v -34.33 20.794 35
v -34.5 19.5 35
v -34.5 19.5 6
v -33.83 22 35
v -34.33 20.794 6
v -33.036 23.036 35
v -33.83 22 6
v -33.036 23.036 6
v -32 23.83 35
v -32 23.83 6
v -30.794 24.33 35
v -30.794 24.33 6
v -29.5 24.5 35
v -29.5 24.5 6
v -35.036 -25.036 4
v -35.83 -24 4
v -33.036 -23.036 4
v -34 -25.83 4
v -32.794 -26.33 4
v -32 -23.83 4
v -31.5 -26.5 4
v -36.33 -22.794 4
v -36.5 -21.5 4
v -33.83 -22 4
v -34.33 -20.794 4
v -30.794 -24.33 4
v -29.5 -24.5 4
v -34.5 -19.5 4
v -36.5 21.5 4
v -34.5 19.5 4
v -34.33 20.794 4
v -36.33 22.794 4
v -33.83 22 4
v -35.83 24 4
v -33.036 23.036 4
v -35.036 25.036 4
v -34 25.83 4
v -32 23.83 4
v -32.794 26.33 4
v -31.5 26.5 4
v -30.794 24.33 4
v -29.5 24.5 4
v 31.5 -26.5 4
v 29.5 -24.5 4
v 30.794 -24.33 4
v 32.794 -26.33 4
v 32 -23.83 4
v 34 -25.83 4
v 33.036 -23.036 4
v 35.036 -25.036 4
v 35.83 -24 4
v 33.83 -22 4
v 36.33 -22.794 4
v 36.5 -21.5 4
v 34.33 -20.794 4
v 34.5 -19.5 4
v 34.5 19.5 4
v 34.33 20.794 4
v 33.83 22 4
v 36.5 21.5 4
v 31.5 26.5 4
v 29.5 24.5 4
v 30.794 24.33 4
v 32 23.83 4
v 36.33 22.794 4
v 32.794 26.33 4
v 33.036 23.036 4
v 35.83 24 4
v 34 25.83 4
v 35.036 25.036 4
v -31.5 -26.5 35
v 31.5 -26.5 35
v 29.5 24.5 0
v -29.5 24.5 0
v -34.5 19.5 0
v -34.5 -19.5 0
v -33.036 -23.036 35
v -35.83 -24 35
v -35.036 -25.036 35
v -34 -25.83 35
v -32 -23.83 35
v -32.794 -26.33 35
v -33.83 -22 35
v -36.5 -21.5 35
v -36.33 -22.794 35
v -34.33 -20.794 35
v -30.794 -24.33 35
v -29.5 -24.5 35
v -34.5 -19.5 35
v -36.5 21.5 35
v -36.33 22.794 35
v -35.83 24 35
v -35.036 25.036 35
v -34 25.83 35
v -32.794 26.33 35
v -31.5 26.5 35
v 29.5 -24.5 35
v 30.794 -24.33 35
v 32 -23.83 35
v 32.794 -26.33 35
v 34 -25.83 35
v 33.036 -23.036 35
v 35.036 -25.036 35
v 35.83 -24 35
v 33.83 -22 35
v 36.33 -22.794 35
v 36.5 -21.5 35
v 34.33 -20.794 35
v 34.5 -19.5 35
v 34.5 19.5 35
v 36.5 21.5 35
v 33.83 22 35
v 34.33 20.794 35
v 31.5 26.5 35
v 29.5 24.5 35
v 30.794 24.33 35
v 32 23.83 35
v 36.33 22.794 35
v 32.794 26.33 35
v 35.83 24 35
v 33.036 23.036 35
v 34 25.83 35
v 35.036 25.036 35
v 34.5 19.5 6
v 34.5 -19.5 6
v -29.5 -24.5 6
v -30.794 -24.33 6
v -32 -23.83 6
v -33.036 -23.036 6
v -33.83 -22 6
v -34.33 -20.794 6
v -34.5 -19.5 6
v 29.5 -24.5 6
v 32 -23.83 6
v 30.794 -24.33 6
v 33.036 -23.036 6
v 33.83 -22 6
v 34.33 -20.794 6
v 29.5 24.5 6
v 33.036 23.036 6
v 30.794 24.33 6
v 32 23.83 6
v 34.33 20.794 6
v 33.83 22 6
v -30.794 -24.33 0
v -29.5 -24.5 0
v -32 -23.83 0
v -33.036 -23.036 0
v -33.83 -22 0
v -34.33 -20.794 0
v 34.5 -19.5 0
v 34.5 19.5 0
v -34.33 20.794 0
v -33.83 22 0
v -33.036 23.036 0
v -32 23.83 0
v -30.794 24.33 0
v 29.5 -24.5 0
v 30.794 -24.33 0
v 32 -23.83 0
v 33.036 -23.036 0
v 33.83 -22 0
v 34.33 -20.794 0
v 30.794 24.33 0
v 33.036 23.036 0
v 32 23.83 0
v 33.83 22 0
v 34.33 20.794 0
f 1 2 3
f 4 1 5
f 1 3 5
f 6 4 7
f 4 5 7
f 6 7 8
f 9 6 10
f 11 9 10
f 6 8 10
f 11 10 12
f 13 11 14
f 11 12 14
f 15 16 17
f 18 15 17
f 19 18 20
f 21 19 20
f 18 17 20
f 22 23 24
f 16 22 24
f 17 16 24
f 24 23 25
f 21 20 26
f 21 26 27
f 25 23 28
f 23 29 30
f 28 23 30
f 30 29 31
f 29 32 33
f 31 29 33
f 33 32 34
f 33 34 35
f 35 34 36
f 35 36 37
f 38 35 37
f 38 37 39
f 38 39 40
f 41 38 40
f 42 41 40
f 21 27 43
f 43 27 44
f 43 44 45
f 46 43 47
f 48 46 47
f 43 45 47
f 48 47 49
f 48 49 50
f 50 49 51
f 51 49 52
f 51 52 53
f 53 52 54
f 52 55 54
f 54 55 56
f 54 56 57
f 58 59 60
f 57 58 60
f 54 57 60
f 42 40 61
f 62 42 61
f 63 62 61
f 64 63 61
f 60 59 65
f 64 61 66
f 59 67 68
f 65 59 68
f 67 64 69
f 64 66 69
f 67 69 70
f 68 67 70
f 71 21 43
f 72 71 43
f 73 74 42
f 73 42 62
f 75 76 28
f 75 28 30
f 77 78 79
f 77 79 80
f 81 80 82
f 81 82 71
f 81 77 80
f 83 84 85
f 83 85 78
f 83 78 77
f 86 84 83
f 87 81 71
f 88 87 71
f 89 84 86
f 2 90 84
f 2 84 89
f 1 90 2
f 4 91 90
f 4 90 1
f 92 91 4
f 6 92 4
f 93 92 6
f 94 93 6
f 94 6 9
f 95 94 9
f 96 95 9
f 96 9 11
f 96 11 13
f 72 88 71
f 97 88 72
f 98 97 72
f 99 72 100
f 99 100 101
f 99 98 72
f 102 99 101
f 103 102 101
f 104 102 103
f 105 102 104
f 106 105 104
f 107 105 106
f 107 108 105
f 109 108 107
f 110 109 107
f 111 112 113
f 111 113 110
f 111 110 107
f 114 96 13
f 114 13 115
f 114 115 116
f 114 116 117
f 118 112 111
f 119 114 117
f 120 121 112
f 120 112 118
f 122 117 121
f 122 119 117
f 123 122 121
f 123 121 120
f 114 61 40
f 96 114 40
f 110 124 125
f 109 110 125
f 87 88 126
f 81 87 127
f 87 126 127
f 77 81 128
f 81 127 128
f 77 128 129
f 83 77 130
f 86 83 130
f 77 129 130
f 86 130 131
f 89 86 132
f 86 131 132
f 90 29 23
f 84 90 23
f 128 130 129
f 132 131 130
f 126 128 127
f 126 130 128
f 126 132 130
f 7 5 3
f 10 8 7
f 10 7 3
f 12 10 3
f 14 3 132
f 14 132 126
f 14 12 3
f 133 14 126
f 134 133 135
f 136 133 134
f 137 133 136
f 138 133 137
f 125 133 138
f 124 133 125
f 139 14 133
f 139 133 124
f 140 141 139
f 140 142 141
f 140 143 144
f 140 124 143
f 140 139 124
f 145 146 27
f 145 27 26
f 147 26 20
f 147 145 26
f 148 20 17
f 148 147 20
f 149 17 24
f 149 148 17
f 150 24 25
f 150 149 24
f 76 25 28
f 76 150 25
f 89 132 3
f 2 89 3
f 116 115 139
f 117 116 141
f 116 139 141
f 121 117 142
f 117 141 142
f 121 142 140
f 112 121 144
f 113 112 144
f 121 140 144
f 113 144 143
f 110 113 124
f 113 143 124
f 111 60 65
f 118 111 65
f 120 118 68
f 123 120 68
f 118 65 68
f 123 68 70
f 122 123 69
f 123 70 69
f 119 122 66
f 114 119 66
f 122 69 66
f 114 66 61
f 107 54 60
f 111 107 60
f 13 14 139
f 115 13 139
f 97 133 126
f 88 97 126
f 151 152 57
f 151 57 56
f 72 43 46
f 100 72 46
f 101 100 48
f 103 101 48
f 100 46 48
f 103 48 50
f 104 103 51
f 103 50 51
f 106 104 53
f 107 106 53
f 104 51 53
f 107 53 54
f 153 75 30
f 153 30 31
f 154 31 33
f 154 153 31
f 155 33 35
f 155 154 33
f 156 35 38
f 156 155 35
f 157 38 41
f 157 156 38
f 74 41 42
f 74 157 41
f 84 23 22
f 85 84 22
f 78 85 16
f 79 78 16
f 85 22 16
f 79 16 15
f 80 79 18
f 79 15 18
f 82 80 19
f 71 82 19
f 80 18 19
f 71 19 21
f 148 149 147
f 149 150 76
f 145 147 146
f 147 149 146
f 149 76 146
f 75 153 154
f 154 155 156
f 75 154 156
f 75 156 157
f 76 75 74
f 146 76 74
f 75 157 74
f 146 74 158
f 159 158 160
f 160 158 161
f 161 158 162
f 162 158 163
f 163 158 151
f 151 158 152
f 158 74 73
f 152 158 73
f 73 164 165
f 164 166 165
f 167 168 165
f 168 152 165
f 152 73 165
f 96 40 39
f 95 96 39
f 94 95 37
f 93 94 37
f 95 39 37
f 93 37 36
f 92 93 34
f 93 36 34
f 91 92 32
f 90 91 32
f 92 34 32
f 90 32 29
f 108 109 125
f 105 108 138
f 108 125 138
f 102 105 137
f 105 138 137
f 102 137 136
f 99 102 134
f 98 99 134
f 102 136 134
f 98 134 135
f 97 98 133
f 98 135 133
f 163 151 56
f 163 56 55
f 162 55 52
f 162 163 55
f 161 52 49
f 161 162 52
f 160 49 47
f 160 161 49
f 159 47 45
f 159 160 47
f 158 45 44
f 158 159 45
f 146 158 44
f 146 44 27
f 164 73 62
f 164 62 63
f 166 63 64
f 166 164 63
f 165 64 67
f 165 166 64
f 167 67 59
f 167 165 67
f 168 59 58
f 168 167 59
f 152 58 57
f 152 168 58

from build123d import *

# Parameters (mm, degrees)
F1_DEPTH = 6
F2_DEPTH = 35
F3_DEPTH = 4


with BuildPart() as f1:
    # F0 (on Top) → F1 (new body)
    with BuildSketch(Plane.XY):
        with BuildLine():
            Line((31.5, 26.5), (-31.5, 26.5))
            ThreePointArc((-31.5, 26.5), (-35.0355339059, 25.0355339059), (-36.5, 21.5))
            Line((-36.5, 21.5), (-36.5, -21.5))
            ThreePointArc((-36.5, -21.5), (-35.0355339059, -25.0355339059), (-31.5, -26.5))
            Line((-31.5, -26.5), (31.5, -26.5))
            ThreePointArc((31.5, -26.5), (35.0355339059, -25.0355339059), (36.5, -21.5))
            Line((36.5, -21.5), (36.5, 21.5))
            ThreePointArc((36.5, 21.5), (35.0355339059, 25.0355339059), (31.5, 26.5))
        make_face()
        with BuildLine():
            ThreePointArc((-34.5, 19.5), (-33.0355339059, 23.0355339059), (-29.5, 24.5))
            Line((-29.5, 24.5), (29.5, 24.5))
            ThreePointArc((29.5, 24.5), (33.0355339059, 23.0355339059), (34.5, 19.5))
            Line((34.5, 19.5), (34.5, -19.5))
            ThreePointArc((34.5, -19.5), (33.0355339059, -23.0355339059), (29.5, -24.5))
            Line((29.5, -24.5), (-29.5, -24.5))
            ThreePointArc((-29.5, -24.5), (-33.0355339059, -23.0355339059), (-34.5, -19.5))
            Line((-34.5, -19.5), (-34.5, 19.5))
        make_face(mode=Mode.SUBTRACT)
        with BuildLine():
            Line((29.5, 24.5), (-29.5, 24.5))
            ThreePointArc((-29.5, 24.5), (-33.0355339059, 23.0355339059), (-34.5, 19.5))
            Line((-34.5, 19.5), (-34.5, -19.5))
            ThreePointArc((-34.5, -19.5), (-33.0355339059, -23.0355339059), (-29.5, -24.5))
            Line((-29.5, -24.5), (29.5, -24.5))
            ThreePointArc((29.5, -24.5), (33.0355339059, -23.0355339059), (34.5, -19.5))
            Line((34.5, -19.5), (34.5, 19.5))
            ThreePointArc((34.5, 19.5), (33.0355339059, 23.0355339059), (29.5, 24.5))
        make_face()
    extrude(amount=F1_DEPTH)

    # F0 (on Top) → F2 (join)
    with BuildSketch(Plane.XY):
        with BuildLine():
            Line((31.5, 26.5), (-31.5, 26.5))
            ThreePointArc((-31.5, 26.5), (-35.0355339059, 25.0355339059), (-36.5, 21.5))
            Line((-36.5, 21.5), (-36.5, -21.5))
            ThreePointArc((-36.5, -21.5), (-35.0355339059, -25.0355339059), (-31.5, -26.5))
            Line((-31.5, -26.5), (31.5, -26.5))
            ThreePointArc((31.5, -26.5), (35.0355339059, -25.0355339059), (36.5, -21.5))
            Line((36.5, -21.5), (36.5, 21.5))
            ThreePointArc((36.5, 21.5), (35.0355339059, 25.0355339059), (31.5, 26.5))
        make_face()
        with BuildLine():
            ThreePointArc((-34.5, 19.5), (-33.0355339059, 23.0355339059), (-29.5, 24.5))
            Line((-29.5, 24.5), (29.5, 24.5))
            ThreePointArc((29.5, 24.5), (33.0355339059, 23.0355339059), (34.5, 19.5))
            Line((34.5, 19.5), (34.5, -19.5))
            ThreePointArc((34.5, -19.5), (33.0355339059, -23.0355339059), (29.5, -24.5))
            Line((29.5, -24.5), (-29.5, -24.5))
            ThreePointArc((-29.5, -24.5), (-33.0355339059, -23.0355339059), (-34.5, -19.5))
            Line((-34.5, -19.5), (-34.5, 19.5))
        make_face(mode=Mode.SUBTRACT)
    extrude(amount=F2_DEPTH)

    # F0 (on Top) → F3 (cut)
    with BuildSketch(Plane.XY):
        with BuildLine():
            Line((31.5, 26.5), (-31.5, 26.5))
            ThreePointArc((-31.5, 26.5), (-35.0355339059, 25.0355339059), (-36.5, 21.5))
            Line((-36.5, 21.5), (-36.5, -21.5))
            ThreePointArc((-36.5, -21.5), (-35.0355339059, -25.0355339059), (-31.5, -26.5))
            Line((-31.5, -26.5), (31.5, -26.5))
            ThreePointArc((31.5, -26.5), (35.0355339059, -25.0355339059), (36.5, -21.5))
            Line((36.5, -21.5), (36.5, 21.5))
            ThreePointArc((36.5, 21.5), (35.0355339059, 25.0355339059), (31.5, 26.5))
        make_face()
        with BuildLine():
            ThreePointArc((-34.5, 19.5), (-33.0355339059, 23.0355339059), (-29.5, 24.5))
            Line((-29.5, 24.5), (29.5, 24.5))
            ThreePointArc((29.5, 24.5), (33.0355339059, 23.0355339059), (34.5, 19.5))
            Line((34.5, 19.5), (34.5, -19.5))
            ThreePointArc((34.5, -19.5), (33.0355339059, -23.0355339059), (29.5, -24.5))
            Line((29.5, -24.5), (-29.5, -24.5))
            ThreePointArc((-29.5, -24.5), (-33.0355339059, -23.0355339059), (-34.5, -19.5))
            Line((-34.5, -19.5), (-34.5, 19.5))
        make_face(mode=Mode.SUBTRACT)
    extrude(amount=F3_DEPTH, mode=Mode.SUBTRACT)


solid = f1.part
